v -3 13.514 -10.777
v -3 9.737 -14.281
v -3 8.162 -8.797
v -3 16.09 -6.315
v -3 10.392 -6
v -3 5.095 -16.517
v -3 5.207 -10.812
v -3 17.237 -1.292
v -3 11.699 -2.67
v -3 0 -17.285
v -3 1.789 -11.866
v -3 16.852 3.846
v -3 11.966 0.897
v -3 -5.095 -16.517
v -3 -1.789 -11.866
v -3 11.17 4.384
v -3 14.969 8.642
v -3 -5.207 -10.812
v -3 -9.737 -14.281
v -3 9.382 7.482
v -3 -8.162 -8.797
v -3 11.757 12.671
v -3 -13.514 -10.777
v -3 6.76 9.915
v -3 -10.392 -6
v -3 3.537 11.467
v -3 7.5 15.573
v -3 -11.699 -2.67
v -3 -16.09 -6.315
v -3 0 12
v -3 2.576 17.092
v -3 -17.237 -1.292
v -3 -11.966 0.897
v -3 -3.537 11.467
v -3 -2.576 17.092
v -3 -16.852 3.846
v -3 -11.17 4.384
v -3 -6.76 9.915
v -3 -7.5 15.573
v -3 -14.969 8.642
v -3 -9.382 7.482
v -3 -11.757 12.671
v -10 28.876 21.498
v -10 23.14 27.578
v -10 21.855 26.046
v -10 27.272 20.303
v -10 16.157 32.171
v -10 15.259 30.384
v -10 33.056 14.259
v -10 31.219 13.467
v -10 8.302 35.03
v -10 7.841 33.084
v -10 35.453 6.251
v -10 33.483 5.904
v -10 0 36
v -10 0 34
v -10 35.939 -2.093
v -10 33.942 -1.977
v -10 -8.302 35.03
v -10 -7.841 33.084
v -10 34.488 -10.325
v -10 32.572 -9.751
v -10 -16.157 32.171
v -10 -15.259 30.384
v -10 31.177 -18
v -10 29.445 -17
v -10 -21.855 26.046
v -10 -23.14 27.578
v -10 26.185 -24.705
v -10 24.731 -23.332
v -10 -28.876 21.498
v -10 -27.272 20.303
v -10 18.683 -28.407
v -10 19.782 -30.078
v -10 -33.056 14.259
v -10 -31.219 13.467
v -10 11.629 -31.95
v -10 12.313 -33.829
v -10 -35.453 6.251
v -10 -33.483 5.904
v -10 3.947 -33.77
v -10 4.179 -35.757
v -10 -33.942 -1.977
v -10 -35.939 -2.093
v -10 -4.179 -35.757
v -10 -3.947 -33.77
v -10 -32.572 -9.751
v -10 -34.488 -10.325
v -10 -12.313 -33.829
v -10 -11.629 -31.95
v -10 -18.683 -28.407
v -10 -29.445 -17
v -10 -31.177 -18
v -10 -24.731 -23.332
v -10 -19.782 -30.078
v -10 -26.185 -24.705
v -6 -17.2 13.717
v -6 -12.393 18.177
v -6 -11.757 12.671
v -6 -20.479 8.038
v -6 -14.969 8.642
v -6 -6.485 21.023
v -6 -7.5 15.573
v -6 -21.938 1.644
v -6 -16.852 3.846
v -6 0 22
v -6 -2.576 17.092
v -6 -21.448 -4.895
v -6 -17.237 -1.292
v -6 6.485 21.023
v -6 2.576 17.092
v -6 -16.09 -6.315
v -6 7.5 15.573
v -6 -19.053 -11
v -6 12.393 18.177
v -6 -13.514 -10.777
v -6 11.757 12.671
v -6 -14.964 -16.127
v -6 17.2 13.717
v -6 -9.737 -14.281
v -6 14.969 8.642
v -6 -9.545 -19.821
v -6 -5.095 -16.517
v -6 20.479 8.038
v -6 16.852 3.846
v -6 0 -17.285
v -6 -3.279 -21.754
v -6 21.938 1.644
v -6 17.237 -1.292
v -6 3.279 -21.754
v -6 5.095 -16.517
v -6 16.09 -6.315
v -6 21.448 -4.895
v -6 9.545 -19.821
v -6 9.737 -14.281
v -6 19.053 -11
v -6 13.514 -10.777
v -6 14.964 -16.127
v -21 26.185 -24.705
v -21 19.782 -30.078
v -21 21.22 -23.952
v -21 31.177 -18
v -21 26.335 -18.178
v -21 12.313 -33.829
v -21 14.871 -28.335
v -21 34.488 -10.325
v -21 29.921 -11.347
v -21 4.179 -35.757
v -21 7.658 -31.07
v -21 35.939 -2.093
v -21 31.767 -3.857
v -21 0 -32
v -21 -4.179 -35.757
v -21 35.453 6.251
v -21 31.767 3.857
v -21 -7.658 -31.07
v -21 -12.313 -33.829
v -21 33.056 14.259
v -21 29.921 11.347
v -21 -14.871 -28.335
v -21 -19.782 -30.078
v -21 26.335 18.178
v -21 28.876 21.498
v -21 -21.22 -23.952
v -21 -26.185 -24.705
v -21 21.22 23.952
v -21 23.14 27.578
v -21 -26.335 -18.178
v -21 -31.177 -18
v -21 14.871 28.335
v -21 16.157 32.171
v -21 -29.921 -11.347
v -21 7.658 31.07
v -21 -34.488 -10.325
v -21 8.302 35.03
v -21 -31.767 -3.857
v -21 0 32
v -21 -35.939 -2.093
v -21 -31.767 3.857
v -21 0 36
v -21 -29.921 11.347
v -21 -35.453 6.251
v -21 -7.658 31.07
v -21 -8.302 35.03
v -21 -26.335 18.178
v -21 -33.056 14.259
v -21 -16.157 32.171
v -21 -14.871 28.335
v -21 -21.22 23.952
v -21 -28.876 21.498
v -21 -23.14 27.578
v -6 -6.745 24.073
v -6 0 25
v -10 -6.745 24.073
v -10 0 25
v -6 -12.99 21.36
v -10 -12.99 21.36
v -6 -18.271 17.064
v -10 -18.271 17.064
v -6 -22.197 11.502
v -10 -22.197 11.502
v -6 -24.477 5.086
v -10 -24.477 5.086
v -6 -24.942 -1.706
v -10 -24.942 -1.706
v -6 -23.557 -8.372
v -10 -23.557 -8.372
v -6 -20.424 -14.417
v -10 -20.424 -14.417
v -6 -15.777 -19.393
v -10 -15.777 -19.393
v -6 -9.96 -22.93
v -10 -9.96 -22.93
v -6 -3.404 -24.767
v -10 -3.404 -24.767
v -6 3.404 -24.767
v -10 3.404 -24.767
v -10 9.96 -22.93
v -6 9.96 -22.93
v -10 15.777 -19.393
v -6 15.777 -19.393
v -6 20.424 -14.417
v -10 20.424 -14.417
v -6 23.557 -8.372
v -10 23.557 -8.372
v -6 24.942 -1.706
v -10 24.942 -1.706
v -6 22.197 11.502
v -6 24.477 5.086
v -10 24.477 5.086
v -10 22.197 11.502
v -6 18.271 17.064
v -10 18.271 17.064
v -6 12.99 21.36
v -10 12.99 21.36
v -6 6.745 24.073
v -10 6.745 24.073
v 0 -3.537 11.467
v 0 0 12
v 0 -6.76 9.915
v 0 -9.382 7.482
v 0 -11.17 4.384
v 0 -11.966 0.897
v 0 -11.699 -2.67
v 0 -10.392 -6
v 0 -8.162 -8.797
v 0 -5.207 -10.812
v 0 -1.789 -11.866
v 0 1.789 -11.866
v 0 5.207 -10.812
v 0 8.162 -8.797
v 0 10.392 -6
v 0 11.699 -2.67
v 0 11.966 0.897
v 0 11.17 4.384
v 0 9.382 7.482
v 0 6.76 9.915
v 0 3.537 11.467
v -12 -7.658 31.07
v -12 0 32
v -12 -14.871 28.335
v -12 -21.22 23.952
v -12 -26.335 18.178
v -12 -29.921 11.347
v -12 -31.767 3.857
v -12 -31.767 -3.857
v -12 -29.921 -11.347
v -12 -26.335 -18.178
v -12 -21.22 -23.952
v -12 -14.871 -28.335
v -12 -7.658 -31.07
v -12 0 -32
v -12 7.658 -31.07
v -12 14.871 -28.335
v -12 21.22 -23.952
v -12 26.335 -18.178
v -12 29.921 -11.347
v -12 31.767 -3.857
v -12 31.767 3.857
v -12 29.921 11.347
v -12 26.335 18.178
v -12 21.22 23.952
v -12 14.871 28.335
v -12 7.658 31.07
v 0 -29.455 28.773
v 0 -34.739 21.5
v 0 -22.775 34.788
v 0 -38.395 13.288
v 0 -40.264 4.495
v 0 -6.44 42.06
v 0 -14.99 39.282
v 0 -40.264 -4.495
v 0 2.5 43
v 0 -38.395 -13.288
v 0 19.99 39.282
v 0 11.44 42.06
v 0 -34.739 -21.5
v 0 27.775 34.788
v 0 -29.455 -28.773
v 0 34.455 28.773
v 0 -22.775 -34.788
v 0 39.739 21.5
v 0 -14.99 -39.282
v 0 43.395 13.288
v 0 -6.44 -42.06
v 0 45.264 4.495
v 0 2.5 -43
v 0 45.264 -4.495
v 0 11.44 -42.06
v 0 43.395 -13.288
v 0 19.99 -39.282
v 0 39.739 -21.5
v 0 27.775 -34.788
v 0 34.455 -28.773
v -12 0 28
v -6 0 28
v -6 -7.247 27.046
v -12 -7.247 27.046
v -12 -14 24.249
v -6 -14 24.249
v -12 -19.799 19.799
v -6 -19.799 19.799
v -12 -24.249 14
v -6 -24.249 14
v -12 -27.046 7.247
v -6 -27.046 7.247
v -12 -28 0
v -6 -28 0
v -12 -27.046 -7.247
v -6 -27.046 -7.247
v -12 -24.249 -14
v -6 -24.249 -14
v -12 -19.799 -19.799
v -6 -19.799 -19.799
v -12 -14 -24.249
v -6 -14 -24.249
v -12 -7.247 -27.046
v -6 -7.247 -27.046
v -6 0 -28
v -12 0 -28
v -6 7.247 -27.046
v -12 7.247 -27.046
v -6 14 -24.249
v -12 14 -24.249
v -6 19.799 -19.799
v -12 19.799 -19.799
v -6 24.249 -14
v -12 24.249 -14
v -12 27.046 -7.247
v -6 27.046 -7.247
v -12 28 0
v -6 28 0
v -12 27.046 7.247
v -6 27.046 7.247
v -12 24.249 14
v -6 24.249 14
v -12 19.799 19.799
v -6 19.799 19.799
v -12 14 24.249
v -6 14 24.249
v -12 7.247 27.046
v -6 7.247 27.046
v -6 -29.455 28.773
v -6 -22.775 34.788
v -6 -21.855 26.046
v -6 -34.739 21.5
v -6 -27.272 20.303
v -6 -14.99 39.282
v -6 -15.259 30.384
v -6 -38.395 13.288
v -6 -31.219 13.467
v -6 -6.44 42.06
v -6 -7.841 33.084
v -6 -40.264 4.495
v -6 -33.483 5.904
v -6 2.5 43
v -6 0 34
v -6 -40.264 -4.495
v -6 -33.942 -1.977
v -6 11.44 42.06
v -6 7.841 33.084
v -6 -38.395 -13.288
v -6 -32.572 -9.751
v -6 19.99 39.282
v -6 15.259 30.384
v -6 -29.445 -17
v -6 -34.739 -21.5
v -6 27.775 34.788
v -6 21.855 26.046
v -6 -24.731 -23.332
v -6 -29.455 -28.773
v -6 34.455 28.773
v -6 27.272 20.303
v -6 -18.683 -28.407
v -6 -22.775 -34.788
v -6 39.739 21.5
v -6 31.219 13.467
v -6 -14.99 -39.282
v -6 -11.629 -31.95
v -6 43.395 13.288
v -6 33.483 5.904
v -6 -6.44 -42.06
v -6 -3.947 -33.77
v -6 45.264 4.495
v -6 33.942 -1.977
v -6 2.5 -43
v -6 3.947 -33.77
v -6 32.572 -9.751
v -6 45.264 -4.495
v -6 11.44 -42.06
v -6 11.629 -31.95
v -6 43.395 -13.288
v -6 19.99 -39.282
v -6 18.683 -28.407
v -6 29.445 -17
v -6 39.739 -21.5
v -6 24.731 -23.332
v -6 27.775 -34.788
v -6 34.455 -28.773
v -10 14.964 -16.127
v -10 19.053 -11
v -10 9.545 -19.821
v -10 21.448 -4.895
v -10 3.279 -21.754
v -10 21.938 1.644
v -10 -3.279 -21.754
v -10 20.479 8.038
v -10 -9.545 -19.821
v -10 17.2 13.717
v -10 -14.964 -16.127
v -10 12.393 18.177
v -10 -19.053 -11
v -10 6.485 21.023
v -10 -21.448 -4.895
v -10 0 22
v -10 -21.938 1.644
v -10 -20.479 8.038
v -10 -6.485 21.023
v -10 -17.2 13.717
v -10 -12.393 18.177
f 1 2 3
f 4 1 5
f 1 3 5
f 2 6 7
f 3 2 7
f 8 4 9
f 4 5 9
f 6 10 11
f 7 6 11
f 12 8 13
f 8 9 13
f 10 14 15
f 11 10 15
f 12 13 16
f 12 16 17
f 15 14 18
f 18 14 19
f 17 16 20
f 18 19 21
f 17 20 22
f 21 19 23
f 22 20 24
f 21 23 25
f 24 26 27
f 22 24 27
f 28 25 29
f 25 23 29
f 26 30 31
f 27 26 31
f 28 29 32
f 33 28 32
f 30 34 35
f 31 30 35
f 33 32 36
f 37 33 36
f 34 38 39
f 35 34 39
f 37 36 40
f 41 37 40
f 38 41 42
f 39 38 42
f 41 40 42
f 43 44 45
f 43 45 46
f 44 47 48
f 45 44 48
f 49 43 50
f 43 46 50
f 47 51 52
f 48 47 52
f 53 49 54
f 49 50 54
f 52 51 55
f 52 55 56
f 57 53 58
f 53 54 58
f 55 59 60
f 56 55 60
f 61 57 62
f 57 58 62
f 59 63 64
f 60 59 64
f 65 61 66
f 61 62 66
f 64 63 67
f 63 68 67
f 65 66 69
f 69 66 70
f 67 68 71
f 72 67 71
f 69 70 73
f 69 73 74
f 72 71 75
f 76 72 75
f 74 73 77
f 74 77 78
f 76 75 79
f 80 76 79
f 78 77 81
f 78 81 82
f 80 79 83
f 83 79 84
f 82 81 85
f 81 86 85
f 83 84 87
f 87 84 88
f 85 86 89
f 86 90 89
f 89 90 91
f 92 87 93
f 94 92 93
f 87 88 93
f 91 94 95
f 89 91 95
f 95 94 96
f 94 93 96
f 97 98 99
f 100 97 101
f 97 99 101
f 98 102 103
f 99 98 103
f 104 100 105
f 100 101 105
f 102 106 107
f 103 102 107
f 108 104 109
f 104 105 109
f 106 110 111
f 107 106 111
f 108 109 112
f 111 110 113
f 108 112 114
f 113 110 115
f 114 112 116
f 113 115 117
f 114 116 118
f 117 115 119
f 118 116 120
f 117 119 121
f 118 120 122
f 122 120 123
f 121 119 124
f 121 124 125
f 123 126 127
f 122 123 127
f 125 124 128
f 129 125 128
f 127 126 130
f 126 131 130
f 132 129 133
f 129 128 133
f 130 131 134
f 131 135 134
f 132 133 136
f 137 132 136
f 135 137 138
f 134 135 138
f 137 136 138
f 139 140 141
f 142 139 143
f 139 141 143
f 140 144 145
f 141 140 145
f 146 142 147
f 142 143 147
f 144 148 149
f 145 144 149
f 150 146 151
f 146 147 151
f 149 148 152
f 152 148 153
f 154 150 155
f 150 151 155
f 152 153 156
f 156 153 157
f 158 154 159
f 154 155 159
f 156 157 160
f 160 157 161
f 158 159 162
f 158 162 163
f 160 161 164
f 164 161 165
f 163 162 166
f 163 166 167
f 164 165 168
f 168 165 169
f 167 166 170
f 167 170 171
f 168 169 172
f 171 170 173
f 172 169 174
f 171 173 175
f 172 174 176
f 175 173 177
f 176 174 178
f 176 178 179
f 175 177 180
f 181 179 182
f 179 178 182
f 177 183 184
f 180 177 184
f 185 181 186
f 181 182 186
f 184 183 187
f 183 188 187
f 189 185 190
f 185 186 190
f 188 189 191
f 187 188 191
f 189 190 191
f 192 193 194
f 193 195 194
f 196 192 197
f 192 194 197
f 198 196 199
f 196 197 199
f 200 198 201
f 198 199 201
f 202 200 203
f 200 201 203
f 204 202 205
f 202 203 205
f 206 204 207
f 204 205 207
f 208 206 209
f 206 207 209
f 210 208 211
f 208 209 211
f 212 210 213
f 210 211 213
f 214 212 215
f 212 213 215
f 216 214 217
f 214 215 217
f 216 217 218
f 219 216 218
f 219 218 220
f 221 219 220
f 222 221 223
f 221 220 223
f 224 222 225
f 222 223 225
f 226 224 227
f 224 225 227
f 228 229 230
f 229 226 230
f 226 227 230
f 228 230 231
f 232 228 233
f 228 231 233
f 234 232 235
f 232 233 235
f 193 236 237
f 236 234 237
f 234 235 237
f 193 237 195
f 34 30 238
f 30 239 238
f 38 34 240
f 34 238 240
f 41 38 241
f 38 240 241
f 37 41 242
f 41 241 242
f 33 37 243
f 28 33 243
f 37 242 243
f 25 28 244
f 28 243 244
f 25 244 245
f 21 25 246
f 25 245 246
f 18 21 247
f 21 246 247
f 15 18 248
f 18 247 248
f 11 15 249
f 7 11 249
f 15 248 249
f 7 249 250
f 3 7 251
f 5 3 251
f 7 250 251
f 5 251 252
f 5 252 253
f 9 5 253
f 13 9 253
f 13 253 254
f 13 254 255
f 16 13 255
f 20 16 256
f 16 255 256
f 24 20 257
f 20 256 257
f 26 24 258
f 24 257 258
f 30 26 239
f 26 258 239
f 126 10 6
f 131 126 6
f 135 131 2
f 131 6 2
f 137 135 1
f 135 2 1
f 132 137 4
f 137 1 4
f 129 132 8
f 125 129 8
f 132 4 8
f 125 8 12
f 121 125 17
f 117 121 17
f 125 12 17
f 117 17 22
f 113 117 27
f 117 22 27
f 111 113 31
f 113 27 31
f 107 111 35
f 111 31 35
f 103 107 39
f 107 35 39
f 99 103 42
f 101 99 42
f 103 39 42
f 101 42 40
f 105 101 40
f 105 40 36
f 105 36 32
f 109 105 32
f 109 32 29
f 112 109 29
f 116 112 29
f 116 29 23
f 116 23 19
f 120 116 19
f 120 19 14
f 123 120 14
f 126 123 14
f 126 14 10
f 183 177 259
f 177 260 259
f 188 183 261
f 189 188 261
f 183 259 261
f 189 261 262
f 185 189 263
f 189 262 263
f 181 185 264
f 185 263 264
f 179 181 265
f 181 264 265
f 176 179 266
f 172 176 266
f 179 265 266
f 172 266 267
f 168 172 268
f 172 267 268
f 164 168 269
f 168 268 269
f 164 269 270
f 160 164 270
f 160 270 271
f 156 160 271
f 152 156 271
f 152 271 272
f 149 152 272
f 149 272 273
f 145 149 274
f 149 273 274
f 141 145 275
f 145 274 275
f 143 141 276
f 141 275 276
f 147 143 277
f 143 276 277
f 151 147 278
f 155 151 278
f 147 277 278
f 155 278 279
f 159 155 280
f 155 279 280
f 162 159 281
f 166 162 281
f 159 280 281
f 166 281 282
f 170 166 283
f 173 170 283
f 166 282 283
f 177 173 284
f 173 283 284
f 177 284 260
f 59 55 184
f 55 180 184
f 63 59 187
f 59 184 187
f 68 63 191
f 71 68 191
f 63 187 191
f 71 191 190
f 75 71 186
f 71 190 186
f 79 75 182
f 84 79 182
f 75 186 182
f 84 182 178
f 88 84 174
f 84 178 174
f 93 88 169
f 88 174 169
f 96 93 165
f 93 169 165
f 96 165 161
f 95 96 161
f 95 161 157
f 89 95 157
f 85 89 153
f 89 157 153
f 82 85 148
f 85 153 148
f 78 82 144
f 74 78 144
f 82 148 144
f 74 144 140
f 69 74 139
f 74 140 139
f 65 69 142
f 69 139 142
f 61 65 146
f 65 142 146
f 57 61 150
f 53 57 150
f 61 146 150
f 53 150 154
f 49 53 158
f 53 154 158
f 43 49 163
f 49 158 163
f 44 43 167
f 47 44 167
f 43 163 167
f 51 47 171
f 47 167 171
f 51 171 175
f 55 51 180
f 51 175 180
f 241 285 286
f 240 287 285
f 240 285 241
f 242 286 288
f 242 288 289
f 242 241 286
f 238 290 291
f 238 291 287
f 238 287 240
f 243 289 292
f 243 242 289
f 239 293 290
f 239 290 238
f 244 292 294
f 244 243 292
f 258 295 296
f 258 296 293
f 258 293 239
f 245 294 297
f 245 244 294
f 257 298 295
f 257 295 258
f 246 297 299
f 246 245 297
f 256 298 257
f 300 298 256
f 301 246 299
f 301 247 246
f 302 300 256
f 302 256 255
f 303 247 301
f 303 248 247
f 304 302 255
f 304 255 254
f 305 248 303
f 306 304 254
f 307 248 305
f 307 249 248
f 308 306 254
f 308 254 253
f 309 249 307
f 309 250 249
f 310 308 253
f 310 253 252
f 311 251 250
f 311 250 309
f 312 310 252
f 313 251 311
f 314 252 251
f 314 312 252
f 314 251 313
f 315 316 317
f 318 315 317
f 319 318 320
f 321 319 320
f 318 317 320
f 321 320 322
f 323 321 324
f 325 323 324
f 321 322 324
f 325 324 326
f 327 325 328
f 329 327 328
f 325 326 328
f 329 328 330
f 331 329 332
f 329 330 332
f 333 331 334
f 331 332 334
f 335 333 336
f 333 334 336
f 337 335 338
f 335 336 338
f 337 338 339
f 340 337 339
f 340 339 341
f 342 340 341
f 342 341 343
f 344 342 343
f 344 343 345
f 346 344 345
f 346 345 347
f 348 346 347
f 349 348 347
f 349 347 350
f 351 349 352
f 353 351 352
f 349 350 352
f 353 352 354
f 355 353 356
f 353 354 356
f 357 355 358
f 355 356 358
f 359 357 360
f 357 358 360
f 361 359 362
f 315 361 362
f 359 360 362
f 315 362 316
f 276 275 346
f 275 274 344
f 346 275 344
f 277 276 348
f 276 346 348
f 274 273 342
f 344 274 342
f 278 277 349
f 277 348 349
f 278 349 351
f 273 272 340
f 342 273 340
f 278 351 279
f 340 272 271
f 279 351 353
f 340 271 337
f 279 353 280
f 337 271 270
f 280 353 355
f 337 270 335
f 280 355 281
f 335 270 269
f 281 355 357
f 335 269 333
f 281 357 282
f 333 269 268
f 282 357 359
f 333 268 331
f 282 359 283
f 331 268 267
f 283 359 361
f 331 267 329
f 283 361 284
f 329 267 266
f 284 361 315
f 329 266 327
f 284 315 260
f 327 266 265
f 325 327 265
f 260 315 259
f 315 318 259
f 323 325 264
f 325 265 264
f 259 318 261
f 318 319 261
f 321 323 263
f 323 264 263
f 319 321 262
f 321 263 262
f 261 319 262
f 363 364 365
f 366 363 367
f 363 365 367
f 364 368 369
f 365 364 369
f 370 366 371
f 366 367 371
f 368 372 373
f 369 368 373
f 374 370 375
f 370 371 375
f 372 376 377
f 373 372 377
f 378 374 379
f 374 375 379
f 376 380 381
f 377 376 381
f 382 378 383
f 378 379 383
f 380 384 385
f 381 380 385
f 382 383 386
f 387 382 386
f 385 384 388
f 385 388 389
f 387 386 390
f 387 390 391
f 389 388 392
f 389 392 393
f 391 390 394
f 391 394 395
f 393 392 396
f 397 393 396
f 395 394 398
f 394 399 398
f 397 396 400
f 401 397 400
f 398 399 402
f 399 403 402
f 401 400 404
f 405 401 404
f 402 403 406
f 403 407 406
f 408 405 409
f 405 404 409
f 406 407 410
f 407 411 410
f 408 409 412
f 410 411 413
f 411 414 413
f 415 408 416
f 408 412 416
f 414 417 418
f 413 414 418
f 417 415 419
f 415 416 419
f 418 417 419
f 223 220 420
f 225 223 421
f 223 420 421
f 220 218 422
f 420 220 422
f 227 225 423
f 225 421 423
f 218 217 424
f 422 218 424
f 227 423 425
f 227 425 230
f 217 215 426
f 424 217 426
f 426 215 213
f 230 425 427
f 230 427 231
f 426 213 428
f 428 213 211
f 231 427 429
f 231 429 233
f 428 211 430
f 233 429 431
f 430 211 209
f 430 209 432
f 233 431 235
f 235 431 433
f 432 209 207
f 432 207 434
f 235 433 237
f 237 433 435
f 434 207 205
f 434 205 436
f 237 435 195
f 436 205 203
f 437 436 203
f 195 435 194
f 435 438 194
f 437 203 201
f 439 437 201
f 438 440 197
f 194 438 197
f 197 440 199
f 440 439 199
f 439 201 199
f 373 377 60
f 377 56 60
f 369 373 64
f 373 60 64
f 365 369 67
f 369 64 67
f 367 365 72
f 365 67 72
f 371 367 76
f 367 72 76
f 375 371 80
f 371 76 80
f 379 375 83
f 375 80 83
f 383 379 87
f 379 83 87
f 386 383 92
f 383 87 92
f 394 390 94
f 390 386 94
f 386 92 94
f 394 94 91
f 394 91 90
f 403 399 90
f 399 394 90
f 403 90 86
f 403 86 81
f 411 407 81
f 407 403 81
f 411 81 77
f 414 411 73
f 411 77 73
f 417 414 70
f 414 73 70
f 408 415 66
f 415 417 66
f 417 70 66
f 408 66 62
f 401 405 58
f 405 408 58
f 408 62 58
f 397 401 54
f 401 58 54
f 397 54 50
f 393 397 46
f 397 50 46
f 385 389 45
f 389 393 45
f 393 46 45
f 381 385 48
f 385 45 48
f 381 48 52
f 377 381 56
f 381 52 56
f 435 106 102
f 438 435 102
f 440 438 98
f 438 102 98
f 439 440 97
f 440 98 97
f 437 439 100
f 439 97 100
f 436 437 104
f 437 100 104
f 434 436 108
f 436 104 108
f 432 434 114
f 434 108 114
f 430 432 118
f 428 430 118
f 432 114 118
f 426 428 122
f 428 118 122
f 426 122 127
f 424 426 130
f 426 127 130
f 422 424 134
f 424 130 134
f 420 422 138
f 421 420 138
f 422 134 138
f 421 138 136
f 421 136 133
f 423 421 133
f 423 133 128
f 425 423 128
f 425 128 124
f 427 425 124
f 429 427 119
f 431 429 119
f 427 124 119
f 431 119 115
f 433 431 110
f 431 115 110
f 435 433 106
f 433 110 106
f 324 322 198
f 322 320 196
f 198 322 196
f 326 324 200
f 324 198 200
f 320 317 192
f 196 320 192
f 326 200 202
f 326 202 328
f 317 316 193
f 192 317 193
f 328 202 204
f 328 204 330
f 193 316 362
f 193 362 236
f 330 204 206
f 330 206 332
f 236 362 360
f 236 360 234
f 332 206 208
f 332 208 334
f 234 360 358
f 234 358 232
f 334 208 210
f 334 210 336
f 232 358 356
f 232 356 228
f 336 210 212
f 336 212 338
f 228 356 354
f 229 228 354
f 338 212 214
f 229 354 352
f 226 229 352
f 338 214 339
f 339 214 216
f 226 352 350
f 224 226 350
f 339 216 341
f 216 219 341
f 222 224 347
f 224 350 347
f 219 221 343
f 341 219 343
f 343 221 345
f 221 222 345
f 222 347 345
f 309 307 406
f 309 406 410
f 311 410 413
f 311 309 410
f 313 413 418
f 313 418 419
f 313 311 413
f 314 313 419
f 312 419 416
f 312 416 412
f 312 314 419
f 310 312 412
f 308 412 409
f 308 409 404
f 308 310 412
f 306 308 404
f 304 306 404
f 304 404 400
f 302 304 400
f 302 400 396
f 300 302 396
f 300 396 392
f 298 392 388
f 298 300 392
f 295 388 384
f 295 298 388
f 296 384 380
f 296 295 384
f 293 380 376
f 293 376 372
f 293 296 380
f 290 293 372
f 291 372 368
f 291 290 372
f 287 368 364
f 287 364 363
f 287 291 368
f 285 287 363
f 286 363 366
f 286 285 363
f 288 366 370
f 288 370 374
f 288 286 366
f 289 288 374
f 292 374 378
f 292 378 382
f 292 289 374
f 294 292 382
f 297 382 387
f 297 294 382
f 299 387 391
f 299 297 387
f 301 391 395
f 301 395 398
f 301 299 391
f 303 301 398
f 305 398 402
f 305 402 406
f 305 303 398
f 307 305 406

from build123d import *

# Parameters (mm, degrees)
ESQUISSE2_R        = 43
ESQUISSE2_R_2      = 17.284931715
BOSS_EXTRU_1_DEPTH = 6


with BuildPart() as part:
    # Esquisse1 → Base-Révolution (revolve)
    with BuildSketch(Plane.XY):
        Polygon((0, 12), (0, 34), (-10, 34), (-10, 36), (-21, 36), (-21, 32), (-12, 32), (-12, 28), (-4, 28), (-4, 25), (-10, 25), (-10, 22), (-4, 22), (-4, 18), (-3, 18), (-3, 12), align=None)
    revolve(axis=Axis((-25.921870853, 0, 0), (1, 0, 0)))

    # Esquisse2 → Boss.-Extru.1 (add)
    with BuildSketch(Plane(origin=(0, 0, 0), x_dir=(0, 0, -1), z_dir=(1, 0, 0))):
        with Locations((0, 2.5)):
            Circle(ESQUISSE2_R)
        Circle(ESQUISSE2_R_2, mode=Mode.SUBTRACT)
    extrude(amount=-BOSS_EXTRU_1_DEPTH)


solid = part.part
